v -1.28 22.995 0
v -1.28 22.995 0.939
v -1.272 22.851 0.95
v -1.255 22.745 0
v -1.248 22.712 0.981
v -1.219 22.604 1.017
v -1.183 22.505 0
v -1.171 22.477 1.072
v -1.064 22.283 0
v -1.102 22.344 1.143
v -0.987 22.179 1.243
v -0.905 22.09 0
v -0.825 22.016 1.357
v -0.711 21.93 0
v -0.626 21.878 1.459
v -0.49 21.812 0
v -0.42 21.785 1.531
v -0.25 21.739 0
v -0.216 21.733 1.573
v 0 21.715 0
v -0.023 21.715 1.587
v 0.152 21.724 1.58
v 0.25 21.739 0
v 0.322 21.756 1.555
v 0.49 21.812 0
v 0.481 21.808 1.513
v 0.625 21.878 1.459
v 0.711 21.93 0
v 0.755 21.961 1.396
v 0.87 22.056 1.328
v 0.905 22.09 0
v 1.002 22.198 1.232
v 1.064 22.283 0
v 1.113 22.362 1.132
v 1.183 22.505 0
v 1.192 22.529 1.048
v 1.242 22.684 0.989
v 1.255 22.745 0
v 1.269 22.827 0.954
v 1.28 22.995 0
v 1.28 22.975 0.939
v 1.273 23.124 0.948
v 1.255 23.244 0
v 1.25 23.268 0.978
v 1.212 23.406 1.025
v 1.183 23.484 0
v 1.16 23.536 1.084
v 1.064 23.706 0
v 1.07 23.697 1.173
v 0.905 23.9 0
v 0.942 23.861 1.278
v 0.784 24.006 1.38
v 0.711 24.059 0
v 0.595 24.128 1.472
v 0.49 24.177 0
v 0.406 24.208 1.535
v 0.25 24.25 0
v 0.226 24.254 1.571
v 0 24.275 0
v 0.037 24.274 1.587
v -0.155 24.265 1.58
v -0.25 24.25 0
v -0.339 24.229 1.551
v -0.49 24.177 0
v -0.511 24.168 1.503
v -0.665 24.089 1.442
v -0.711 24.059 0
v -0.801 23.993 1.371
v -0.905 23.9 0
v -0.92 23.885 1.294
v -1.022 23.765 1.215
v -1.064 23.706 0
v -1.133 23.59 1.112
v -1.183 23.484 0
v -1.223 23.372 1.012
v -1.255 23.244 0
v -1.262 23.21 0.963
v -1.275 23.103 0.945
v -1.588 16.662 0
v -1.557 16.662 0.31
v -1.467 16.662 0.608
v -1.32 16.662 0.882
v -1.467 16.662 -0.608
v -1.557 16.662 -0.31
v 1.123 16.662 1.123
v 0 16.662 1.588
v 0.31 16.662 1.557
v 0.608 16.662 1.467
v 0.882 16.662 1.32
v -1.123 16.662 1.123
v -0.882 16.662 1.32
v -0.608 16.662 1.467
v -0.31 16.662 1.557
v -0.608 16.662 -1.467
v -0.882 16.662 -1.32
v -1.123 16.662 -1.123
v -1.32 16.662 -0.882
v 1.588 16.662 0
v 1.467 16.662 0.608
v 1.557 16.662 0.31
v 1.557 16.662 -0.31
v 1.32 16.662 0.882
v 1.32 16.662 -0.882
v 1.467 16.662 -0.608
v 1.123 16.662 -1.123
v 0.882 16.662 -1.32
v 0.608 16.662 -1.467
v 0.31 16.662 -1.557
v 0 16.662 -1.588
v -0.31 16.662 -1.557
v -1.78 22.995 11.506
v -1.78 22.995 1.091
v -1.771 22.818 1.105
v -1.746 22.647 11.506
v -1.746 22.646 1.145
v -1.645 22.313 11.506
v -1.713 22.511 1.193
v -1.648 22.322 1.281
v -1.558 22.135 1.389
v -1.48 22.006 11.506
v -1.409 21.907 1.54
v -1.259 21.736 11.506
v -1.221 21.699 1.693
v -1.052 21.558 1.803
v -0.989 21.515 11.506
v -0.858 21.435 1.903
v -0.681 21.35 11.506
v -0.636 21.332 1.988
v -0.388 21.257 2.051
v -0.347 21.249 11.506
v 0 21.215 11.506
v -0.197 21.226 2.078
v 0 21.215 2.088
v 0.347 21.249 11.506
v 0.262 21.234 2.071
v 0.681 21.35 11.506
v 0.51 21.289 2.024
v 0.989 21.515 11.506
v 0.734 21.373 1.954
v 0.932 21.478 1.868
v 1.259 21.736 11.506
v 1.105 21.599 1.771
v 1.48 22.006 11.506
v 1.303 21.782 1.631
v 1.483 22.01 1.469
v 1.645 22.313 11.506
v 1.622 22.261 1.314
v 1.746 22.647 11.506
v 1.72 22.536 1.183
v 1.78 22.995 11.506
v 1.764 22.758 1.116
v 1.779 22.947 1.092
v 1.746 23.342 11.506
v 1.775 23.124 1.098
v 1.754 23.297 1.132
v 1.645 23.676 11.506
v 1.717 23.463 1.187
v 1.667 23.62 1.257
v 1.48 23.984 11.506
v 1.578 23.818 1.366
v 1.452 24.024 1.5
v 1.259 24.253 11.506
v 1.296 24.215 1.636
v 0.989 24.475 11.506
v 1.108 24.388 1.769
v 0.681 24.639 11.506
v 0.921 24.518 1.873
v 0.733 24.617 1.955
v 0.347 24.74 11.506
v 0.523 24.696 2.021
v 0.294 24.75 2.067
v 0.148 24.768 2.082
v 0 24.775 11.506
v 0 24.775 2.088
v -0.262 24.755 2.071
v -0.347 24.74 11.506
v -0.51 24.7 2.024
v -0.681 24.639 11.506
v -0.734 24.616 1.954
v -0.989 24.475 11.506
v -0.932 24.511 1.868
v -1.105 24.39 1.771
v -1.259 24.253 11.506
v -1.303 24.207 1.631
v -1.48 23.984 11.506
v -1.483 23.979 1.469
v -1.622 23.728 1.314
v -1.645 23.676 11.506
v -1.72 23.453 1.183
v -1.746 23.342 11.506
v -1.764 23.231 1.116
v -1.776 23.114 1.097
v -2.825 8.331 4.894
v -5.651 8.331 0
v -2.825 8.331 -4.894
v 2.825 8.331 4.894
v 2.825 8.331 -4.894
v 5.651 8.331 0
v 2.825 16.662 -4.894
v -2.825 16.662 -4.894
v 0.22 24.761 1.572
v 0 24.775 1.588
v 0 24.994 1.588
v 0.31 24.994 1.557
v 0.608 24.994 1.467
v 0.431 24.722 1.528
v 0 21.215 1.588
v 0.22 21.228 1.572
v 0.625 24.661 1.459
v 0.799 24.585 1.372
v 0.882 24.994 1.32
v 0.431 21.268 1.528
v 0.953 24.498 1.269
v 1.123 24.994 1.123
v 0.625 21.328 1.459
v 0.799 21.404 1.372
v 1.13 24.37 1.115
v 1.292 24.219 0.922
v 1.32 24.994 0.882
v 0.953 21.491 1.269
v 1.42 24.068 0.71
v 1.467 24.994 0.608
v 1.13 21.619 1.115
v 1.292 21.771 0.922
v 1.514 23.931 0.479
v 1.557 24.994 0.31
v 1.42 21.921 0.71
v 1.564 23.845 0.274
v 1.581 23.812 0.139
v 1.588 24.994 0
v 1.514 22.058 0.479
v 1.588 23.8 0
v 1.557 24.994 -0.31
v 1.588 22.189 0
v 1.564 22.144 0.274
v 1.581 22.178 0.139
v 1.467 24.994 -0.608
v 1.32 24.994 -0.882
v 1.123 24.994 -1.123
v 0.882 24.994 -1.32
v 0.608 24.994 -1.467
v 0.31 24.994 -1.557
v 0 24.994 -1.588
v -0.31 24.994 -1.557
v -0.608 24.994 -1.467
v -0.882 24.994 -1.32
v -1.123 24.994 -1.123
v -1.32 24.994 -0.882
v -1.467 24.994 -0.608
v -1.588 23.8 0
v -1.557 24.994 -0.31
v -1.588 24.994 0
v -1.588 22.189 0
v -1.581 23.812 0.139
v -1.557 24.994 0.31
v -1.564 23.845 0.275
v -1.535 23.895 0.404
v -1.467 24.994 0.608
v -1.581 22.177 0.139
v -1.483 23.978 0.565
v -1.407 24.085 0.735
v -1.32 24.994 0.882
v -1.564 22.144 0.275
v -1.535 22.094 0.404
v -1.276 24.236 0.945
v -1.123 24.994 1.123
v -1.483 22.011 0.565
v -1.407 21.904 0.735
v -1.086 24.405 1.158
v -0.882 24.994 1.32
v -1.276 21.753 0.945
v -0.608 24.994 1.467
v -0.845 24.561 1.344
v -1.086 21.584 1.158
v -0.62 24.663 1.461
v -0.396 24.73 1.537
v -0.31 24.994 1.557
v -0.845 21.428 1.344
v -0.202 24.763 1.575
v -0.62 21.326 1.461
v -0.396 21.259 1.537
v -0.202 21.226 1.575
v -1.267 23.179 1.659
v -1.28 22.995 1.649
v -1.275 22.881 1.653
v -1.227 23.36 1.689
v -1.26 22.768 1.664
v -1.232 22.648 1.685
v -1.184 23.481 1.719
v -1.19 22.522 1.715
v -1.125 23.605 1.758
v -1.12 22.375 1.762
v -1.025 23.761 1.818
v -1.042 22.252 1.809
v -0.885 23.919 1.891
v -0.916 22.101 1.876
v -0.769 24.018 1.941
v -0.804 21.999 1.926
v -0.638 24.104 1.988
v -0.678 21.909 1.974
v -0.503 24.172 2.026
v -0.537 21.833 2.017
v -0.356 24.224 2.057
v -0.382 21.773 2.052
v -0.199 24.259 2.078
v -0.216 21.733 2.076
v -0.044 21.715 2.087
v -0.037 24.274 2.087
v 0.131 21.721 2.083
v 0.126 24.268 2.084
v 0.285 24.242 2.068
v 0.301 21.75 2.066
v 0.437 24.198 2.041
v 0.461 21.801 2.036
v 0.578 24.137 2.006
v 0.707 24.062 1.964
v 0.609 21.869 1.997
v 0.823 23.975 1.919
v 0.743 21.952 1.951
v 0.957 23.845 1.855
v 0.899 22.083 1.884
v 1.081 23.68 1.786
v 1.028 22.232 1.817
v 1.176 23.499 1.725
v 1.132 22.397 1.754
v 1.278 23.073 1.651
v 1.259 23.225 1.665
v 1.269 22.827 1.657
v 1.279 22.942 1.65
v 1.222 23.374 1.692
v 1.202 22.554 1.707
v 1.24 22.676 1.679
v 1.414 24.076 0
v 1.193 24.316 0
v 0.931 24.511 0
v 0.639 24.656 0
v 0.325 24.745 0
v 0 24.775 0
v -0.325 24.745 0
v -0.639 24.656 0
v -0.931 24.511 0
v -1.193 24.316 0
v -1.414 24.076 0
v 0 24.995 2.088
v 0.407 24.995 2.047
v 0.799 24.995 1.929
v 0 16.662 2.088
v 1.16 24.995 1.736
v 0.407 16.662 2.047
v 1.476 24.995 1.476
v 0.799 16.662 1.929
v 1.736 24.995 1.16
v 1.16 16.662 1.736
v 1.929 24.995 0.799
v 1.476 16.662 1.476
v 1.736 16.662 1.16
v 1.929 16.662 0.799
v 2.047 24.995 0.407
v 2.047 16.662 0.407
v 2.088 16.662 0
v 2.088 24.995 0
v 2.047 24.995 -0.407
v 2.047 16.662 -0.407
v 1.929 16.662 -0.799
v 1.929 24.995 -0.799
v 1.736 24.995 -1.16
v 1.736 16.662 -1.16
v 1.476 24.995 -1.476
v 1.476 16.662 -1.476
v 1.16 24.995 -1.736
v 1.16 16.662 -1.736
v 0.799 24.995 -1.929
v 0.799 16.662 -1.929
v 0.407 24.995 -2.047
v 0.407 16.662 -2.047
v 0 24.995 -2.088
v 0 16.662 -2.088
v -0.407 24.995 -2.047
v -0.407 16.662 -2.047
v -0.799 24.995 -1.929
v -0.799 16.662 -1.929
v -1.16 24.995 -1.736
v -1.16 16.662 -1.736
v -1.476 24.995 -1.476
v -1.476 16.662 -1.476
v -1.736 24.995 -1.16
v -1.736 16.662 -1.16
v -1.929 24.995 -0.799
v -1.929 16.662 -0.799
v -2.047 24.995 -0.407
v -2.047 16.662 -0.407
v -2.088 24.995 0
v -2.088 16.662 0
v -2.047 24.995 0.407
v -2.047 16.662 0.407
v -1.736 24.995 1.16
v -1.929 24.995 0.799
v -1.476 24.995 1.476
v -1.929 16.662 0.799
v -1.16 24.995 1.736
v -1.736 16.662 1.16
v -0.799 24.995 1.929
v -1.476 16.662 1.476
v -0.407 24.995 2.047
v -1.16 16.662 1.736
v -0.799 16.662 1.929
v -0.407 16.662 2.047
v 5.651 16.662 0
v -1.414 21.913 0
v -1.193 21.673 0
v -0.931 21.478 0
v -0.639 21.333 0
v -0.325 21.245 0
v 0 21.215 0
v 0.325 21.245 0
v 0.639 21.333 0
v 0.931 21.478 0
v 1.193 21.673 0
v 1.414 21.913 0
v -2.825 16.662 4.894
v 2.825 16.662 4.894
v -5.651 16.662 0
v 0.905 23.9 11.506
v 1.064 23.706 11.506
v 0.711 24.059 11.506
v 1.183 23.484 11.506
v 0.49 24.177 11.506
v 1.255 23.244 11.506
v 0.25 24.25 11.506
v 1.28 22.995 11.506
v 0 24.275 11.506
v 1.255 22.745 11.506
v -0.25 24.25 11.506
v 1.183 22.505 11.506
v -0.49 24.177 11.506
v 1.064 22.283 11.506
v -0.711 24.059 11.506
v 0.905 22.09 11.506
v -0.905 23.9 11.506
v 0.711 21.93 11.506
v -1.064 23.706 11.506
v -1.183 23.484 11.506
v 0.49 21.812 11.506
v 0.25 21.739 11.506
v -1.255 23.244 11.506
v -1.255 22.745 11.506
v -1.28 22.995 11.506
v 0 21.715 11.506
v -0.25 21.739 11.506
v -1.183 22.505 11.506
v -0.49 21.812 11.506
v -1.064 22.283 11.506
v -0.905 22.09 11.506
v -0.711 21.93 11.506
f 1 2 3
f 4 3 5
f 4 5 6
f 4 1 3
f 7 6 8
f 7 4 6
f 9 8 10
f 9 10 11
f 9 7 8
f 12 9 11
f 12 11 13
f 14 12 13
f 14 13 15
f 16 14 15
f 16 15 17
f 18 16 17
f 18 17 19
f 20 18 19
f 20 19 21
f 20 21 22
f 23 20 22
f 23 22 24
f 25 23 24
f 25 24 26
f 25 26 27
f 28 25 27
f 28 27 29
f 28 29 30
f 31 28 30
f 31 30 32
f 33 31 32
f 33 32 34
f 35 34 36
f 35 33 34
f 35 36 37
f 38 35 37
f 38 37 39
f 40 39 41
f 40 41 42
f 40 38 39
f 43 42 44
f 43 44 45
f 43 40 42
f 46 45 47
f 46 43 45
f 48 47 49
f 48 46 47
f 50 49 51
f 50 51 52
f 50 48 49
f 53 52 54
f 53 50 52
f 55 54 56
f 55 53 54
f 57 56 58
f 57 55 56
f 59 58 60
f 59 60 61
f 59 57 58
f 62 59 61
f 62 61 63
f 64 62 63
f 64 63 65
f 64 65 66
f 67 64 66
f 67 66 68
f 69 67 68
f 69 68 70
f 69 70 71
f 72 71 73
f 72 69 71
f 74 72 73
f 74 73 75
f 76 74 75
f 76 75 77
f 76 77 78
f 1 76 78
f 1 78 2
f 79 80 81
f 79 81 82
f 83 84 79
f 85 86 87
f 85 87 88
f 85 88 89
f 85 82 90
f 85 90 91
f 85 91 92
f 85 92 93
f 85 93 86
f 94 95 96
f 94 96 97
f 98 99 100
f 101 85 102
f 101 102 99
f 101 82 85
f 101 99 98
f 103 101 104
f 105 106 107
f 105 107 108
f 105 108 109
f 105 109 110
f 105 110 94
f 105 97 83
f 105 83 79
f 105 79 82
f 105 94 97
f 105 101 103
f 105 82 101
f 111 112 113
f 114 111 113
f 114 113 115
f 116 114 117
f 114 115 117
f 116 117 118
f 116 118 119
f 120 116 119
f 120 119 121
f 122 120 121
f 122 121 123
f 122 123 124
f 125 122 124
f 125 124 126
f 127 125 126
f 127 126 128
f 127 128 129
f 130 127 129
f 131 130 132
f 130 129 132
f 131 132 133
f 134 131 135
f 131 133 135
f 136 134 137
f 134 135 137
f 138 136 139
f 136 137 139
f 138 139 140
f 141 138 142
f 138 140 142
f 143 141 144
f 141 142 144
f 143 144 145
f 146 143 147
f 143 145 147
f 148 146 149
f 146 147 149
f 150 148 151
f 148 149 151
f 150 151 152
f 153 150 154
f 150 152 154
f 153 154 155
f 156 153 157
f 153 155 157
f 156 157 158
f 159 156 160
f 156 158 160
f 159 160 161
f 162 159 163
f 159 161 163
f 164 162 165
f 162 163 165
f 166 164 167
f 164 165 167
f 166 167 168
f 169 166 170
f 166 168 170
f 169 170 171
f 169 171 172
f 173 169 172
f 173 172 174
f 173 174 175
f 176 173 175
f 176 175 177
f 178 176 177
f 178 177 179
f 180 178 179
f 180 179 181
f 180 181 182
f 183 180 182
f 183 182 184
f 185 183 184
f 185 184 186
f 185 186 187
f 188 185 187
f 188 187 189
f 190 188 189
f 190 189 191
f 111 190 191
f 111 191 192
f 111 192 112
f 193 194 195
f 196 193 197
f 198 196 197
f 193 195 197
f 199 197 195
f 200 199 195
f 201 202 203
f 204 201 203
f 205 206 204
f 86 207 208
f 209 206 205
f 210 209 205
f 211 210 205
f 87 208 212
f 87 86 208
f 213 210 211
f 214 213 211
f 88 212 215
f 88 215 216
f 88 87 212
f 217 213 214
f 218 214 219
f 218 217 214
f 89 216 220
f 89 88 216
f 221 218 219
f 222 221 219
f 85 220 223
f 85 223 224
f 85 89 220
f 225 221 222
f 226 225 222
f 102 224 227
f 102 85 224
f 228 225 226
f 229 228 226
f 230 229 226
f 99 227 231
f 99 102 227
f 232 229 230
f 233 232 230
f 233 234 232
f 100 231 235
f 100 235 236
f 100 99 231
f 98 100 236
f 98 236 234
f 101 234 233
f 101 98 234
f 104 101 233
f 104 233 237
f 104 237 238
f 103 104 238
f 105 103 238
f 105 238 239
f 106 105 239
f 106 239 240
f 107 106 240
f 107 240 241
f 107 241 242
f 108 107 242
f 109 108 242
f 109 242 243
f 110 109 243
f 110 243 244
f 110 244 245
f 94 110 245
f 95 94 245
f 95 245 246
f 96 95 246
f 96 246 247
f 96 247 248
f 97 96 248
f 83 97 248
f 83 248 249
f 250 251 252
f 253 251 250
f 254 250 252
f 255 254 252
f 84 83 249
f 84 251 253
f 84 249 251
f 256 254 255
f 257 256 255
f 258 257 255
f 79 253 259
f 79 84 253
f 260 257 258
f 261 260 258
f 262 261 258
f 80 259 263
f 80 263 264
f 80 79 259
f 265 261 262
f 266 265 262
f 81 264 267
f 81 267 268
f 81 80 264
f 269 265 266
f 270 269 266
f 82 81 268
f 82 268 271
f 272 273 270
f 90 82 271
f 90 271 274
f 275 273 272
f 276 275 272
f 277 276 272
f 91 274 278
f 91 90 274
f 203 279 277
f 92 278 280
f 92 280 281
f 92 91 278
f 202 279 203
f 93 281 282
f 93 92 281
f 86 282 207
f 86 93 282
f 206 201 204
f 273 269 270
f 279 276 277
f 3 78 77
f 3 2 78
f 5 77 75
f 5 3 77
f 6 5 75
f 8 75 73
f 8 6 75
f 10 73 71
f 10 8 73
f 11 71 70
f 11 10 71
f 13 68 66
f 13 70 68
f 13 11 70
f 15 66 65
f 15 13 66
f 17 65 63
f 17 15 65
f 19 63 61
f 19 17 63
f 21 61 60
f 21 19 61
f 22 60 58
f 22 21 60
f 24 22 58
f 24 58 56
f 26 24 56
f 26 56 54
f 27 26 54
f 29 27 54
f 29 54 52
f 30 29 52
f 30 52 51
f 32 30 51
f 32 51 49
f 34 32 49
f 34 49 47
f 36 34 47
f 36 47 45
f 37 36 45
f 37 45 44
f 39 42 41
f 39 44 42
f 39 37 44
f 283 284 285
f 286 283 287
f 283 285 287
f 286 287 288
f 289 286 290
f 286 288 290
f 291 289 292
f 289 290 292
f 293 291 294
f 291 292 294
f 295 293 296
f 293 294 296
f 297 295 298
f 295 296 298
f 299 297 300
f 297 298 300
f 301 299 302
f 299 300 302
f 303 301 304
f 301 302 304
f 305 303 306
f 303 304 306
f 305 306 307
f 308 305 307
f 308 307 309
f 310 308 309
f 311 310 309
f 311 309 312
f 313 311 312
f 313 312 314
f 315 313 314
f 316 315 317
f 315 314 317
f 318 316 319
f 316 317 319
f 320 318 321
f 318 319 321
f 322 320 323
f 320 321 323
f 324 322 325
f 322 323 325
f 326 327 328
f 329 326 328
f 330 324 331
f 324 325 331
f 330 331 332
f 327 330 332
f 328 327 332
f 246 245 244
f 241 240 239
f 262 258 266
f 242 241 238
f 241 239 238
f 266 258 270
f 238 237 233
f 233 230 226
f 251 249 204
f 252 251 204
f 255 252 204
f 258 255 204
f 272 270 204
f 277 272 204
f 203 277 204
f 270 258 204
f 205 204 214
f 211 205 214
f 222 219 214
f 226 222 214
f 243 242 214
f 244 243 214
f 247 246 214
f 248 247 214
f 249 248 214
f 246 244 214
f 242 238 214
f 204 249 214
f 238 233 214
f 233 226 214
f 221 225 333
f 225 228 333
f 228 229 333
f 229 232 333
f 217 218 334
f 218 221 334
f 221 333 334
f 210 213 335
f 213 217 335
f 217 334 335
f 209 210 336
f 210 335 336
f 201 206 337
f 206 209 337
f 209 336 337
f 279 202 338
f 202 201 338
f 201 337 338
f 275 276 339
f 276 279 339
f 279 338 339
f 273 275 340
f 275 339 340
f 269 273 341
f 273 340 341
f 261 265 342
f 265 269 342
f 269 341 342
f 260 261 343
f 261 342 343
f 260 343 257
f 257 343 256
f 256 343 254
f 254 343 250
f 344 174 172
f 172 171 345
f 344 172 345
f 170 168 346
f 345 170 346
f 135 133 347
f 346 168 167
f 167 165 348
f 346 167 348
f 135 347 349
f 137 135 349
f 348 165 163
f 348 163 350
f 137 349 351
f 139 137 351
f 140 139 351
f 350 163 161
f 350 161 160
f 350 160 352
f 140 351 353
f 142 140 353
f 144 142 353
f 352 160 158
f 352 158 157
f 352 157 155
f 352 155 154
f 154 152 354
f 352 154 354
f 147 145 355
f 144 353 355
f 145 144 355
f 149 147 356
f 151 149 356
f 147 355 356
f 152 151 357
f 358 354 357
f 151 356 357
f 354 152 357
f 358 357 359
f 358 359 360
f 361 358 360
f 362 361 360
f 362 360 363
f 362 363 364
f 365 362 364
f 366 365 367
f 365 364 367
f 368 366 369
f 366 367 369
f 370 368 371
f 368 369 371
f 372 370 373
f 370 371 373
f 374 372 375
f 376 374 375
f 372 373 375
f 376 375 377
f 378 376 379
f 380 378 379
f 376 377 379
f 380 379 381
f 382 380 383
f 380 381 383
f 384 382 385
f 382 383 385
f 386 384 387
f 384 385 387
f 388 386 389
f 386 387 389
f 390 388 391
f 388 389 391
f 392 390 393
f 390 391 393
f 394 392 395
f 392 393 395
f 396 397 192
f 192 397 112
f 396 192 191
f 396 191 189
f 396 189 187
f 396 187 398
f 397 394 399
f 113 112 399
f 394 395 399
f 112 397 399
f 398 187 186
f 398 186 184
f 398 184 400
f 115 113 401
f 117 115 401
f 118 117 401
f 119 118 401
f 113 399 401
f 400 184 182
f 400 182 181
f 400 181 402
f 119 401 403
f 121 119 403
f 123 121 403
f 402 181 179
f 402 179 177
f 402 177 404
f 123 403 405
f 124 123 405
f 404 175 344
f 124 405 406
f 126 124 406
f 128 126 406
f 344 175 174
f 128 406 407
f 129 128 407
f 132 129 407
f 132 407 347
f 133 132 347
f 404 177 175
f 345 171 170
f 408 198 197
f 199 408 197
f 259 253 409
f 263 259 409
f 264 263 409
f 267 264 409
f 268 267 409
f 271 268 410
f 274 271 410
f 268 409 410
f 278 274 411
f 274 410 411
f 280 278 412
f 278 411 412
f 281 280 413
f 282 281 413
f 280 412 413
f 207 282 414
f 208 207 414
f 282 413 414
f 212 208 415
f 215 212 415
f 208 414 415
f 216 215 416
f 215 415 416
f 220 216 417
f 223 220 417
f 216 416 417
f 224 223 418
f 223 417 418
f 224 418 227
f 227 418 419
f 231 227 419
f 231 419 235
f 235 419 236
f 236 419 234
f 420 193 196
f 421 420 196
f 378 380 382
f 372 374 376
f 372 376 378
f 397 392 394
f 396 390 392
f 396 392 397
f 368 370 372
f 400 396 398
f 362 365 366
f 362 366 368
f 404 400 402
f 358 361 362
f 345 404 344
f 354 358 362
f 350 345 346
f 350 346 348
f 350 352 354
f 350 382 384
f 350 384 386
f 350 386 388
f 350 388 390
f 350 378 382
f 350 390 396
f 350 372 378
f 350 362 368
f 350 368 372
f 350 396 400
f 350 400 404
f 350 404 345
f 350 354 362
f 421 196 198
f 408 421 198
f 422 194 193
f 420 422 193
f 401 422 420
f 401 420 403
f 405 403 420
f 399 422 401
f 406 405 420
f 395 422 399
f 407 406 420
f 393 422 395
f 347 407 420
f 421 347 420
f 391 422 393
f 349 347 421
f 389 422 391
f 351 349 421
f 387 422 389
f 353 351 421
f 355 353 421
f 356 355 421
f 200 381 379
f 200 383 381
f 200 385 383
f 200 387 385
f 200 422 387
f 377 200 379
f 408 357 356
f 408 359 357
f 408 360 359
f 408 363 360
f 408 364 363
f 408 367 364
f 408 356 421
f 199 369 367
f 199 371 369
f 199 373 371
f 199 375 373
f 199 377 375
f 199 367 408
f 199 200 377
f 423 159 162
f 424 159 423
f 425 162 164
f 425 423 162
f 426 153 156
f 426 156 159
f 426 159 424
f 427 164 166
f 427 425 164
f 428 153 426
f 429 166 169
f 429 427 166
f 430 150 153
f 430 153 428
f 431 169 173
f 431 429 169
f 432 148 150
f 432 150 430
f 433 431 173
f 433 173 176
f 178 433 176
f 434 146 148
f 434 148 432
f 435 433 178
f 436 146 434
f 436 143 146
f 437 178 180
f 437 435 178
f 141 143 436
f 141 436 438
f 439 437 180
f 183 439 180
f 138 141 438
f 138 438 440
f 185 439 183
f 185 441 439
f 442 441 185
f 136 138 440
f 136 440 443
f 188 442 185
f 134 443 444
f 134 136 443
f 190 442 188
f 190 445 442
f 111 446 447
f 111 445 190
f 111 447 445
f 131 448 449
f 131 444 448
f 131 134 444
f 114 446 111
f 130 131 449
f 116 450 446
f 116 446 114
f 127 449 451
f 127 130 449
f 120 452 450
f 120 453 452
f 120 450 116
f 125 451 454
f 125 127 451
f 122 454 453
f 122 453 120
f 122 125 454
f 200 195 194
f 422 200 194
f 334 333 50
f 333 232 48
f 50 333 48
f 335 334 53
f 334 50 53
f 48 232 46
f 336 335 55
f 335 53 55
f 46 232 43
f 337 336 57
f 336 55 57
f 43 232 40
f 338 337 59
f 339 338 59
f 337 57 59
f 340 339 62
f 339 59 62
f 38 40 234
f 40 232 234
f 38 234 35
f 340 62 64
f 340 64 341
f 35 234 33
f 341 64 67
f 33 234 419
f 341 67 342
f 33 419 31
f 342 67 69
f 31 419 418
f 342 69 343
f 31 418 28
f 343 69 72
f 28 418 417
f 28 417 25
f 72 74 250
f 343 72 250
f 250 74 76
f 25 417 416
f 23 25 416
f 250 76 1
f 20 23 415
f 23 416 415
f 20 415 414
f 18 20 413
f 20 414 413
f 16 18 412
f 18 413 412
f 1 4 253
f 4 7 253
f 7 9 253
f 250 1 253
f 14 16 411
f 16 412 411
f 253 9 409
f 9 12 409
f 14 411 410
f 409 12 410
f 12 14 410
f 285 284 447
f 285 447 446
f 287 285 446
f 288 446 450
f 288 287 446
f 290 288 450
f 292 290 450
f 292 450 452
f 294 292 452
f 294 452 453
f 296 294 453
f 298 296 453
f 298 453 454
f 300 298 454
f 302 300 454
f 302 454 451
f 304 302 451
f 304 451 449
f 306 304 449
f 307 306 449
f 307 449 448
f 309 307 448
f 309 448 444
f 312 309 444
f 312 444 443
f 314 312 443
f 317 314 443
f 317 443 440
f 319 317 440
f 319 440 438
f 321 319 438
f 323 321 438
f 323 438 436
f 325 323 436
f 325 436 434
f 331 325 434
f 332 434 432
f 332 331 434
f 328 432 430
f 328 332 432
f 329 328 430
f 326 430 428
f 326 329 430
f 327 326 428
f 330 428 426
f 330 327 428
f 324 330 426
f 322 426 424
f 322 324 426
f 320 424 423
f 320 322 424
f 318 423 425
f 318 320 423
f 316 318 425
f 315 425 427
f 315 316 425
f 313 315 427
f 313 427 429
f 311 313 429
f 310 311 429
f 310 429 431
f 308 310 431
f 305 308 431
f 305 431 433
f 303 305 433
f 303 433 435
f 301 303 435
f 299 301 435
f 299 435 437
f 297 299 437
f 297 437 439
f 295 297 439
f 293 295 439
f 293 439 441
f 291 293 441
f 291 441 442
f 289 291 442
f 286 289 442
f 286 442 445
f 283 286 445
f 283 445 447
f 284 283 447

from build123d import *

# Parameters (mm, degrees)
SKETCH1_R           = 4.7625
SKETCH1_R_2         = 3.175
BOSS_EXTRUDE1_DEPTH = 8.3312
BOSS_EXTRUDE2_DEPTH = 8.3312
SKETCH3_R           = 2.0875
SKETCH3_R_2         = 1.5875
BOSS_EXTRUDE3_DEPTH = 8.3312
SKETCH4_R           = 2.0875
BOSS_EXTRUDE4_DEPTH = 0.001
SKETCH5_R           = 1.78
SKETCH5_R_2         = 1.28
BOSS_EXTRUDE5_DEPTH = 11.5062
SKETCH6_R           = 10.258070852
CUT_EXTRUDE1_DEPTH  = 8.3312


with BuildPart() as part:
    # Sketch1 → Boss-Extrude1 (new body)
    with BuildSketch(Plane(origin=(0, 0, 0), x_dir=(1, 0, 0), z_dir=(0, 1, 0))):
        with Locations(Location((0, 0, 0), (0, 0, 270))):
            Circle(SKETCH1_R)
        with Locations(Location((0, 0, 0), (0, 0, 270))):
            Circle(SKETCH1_R_2, mode=Mode.SUBTRACT)
    extrude(amount=BOSS_EXTRUDE1_DEPTH)

    # Sketch2 → Boss-Extrude2 (add)
    with BuildSketch(Plane(origin=(0, 8.3312, 0), x_dir=(1, 0, 0), z_dir=(0, 1, 0))):
        Polygon((5.65061043, 0), (2.825305215, 4.893572179), (-2.825305215, 4.893572179), (-5.65061043, 0), (-2.825305215, -4.893572179), (2.825305215, -4.893572179), align=None)
    extrude(amount=BOSS_EXTRUDE2_DEPTH)

    # Sketch3 → Boss-Extrude3 (add)
    with BuildSketch(Plane(origin=(0, 16.6624, 0), x_dir=(1, 0, 0), z_dir=(0, 1, 0))):
        with Locations(Location((0, 0, 0), (0, 0, 270))):
            Circle(SKETCH3_R)
        with Locations(Location((0, 0, 0), (0, 0, 270))):
            Circle(SKETCH3_R_2, mode=Mode.SUBTRACT)
    extrude(amount=BOSS_EXTRUDE3_DEPTH)

    # Sketch4 → Boss-Extrude4 (add)
    with BuildSketch(Plane(origin=(0, 24.9936, 0), x_dir=(1, 0, 0), z_dir=(0, 1, 0))):
        with Locations(Location((0, 0, 0), (0, 0, 270))):
            Circle(SKETCH4_R)
    extrude(amount=BOSS_EXTRUDE4_DEPTH)

    # Sketch5 → Boss-Extrude5 (add)
    with BuildSketch(Plane.XY):
        with Locations(Location((0, 22.9946, 0), (0, 0, 180))):
            Circle(SKETCH5_R)
        with Locations(Location((0, 22.9946, 0), (0, 0, 180))):
            Circle(SKETCH5_R_2, mode=Mode.SUBTRACT)
    extrude(amount=BOSS_EXTRUDE5_DEPTH)

    # Sketch6 → Cut-Extrude1 (cut)
    with BuildSketch(Plane.XZ):
        Circle(SKETCH6_R)
    extrude(amount=-CUT_EXTRUDE1_DEPTH, mode=Mode.SUBTRACT)


solid = part.part
